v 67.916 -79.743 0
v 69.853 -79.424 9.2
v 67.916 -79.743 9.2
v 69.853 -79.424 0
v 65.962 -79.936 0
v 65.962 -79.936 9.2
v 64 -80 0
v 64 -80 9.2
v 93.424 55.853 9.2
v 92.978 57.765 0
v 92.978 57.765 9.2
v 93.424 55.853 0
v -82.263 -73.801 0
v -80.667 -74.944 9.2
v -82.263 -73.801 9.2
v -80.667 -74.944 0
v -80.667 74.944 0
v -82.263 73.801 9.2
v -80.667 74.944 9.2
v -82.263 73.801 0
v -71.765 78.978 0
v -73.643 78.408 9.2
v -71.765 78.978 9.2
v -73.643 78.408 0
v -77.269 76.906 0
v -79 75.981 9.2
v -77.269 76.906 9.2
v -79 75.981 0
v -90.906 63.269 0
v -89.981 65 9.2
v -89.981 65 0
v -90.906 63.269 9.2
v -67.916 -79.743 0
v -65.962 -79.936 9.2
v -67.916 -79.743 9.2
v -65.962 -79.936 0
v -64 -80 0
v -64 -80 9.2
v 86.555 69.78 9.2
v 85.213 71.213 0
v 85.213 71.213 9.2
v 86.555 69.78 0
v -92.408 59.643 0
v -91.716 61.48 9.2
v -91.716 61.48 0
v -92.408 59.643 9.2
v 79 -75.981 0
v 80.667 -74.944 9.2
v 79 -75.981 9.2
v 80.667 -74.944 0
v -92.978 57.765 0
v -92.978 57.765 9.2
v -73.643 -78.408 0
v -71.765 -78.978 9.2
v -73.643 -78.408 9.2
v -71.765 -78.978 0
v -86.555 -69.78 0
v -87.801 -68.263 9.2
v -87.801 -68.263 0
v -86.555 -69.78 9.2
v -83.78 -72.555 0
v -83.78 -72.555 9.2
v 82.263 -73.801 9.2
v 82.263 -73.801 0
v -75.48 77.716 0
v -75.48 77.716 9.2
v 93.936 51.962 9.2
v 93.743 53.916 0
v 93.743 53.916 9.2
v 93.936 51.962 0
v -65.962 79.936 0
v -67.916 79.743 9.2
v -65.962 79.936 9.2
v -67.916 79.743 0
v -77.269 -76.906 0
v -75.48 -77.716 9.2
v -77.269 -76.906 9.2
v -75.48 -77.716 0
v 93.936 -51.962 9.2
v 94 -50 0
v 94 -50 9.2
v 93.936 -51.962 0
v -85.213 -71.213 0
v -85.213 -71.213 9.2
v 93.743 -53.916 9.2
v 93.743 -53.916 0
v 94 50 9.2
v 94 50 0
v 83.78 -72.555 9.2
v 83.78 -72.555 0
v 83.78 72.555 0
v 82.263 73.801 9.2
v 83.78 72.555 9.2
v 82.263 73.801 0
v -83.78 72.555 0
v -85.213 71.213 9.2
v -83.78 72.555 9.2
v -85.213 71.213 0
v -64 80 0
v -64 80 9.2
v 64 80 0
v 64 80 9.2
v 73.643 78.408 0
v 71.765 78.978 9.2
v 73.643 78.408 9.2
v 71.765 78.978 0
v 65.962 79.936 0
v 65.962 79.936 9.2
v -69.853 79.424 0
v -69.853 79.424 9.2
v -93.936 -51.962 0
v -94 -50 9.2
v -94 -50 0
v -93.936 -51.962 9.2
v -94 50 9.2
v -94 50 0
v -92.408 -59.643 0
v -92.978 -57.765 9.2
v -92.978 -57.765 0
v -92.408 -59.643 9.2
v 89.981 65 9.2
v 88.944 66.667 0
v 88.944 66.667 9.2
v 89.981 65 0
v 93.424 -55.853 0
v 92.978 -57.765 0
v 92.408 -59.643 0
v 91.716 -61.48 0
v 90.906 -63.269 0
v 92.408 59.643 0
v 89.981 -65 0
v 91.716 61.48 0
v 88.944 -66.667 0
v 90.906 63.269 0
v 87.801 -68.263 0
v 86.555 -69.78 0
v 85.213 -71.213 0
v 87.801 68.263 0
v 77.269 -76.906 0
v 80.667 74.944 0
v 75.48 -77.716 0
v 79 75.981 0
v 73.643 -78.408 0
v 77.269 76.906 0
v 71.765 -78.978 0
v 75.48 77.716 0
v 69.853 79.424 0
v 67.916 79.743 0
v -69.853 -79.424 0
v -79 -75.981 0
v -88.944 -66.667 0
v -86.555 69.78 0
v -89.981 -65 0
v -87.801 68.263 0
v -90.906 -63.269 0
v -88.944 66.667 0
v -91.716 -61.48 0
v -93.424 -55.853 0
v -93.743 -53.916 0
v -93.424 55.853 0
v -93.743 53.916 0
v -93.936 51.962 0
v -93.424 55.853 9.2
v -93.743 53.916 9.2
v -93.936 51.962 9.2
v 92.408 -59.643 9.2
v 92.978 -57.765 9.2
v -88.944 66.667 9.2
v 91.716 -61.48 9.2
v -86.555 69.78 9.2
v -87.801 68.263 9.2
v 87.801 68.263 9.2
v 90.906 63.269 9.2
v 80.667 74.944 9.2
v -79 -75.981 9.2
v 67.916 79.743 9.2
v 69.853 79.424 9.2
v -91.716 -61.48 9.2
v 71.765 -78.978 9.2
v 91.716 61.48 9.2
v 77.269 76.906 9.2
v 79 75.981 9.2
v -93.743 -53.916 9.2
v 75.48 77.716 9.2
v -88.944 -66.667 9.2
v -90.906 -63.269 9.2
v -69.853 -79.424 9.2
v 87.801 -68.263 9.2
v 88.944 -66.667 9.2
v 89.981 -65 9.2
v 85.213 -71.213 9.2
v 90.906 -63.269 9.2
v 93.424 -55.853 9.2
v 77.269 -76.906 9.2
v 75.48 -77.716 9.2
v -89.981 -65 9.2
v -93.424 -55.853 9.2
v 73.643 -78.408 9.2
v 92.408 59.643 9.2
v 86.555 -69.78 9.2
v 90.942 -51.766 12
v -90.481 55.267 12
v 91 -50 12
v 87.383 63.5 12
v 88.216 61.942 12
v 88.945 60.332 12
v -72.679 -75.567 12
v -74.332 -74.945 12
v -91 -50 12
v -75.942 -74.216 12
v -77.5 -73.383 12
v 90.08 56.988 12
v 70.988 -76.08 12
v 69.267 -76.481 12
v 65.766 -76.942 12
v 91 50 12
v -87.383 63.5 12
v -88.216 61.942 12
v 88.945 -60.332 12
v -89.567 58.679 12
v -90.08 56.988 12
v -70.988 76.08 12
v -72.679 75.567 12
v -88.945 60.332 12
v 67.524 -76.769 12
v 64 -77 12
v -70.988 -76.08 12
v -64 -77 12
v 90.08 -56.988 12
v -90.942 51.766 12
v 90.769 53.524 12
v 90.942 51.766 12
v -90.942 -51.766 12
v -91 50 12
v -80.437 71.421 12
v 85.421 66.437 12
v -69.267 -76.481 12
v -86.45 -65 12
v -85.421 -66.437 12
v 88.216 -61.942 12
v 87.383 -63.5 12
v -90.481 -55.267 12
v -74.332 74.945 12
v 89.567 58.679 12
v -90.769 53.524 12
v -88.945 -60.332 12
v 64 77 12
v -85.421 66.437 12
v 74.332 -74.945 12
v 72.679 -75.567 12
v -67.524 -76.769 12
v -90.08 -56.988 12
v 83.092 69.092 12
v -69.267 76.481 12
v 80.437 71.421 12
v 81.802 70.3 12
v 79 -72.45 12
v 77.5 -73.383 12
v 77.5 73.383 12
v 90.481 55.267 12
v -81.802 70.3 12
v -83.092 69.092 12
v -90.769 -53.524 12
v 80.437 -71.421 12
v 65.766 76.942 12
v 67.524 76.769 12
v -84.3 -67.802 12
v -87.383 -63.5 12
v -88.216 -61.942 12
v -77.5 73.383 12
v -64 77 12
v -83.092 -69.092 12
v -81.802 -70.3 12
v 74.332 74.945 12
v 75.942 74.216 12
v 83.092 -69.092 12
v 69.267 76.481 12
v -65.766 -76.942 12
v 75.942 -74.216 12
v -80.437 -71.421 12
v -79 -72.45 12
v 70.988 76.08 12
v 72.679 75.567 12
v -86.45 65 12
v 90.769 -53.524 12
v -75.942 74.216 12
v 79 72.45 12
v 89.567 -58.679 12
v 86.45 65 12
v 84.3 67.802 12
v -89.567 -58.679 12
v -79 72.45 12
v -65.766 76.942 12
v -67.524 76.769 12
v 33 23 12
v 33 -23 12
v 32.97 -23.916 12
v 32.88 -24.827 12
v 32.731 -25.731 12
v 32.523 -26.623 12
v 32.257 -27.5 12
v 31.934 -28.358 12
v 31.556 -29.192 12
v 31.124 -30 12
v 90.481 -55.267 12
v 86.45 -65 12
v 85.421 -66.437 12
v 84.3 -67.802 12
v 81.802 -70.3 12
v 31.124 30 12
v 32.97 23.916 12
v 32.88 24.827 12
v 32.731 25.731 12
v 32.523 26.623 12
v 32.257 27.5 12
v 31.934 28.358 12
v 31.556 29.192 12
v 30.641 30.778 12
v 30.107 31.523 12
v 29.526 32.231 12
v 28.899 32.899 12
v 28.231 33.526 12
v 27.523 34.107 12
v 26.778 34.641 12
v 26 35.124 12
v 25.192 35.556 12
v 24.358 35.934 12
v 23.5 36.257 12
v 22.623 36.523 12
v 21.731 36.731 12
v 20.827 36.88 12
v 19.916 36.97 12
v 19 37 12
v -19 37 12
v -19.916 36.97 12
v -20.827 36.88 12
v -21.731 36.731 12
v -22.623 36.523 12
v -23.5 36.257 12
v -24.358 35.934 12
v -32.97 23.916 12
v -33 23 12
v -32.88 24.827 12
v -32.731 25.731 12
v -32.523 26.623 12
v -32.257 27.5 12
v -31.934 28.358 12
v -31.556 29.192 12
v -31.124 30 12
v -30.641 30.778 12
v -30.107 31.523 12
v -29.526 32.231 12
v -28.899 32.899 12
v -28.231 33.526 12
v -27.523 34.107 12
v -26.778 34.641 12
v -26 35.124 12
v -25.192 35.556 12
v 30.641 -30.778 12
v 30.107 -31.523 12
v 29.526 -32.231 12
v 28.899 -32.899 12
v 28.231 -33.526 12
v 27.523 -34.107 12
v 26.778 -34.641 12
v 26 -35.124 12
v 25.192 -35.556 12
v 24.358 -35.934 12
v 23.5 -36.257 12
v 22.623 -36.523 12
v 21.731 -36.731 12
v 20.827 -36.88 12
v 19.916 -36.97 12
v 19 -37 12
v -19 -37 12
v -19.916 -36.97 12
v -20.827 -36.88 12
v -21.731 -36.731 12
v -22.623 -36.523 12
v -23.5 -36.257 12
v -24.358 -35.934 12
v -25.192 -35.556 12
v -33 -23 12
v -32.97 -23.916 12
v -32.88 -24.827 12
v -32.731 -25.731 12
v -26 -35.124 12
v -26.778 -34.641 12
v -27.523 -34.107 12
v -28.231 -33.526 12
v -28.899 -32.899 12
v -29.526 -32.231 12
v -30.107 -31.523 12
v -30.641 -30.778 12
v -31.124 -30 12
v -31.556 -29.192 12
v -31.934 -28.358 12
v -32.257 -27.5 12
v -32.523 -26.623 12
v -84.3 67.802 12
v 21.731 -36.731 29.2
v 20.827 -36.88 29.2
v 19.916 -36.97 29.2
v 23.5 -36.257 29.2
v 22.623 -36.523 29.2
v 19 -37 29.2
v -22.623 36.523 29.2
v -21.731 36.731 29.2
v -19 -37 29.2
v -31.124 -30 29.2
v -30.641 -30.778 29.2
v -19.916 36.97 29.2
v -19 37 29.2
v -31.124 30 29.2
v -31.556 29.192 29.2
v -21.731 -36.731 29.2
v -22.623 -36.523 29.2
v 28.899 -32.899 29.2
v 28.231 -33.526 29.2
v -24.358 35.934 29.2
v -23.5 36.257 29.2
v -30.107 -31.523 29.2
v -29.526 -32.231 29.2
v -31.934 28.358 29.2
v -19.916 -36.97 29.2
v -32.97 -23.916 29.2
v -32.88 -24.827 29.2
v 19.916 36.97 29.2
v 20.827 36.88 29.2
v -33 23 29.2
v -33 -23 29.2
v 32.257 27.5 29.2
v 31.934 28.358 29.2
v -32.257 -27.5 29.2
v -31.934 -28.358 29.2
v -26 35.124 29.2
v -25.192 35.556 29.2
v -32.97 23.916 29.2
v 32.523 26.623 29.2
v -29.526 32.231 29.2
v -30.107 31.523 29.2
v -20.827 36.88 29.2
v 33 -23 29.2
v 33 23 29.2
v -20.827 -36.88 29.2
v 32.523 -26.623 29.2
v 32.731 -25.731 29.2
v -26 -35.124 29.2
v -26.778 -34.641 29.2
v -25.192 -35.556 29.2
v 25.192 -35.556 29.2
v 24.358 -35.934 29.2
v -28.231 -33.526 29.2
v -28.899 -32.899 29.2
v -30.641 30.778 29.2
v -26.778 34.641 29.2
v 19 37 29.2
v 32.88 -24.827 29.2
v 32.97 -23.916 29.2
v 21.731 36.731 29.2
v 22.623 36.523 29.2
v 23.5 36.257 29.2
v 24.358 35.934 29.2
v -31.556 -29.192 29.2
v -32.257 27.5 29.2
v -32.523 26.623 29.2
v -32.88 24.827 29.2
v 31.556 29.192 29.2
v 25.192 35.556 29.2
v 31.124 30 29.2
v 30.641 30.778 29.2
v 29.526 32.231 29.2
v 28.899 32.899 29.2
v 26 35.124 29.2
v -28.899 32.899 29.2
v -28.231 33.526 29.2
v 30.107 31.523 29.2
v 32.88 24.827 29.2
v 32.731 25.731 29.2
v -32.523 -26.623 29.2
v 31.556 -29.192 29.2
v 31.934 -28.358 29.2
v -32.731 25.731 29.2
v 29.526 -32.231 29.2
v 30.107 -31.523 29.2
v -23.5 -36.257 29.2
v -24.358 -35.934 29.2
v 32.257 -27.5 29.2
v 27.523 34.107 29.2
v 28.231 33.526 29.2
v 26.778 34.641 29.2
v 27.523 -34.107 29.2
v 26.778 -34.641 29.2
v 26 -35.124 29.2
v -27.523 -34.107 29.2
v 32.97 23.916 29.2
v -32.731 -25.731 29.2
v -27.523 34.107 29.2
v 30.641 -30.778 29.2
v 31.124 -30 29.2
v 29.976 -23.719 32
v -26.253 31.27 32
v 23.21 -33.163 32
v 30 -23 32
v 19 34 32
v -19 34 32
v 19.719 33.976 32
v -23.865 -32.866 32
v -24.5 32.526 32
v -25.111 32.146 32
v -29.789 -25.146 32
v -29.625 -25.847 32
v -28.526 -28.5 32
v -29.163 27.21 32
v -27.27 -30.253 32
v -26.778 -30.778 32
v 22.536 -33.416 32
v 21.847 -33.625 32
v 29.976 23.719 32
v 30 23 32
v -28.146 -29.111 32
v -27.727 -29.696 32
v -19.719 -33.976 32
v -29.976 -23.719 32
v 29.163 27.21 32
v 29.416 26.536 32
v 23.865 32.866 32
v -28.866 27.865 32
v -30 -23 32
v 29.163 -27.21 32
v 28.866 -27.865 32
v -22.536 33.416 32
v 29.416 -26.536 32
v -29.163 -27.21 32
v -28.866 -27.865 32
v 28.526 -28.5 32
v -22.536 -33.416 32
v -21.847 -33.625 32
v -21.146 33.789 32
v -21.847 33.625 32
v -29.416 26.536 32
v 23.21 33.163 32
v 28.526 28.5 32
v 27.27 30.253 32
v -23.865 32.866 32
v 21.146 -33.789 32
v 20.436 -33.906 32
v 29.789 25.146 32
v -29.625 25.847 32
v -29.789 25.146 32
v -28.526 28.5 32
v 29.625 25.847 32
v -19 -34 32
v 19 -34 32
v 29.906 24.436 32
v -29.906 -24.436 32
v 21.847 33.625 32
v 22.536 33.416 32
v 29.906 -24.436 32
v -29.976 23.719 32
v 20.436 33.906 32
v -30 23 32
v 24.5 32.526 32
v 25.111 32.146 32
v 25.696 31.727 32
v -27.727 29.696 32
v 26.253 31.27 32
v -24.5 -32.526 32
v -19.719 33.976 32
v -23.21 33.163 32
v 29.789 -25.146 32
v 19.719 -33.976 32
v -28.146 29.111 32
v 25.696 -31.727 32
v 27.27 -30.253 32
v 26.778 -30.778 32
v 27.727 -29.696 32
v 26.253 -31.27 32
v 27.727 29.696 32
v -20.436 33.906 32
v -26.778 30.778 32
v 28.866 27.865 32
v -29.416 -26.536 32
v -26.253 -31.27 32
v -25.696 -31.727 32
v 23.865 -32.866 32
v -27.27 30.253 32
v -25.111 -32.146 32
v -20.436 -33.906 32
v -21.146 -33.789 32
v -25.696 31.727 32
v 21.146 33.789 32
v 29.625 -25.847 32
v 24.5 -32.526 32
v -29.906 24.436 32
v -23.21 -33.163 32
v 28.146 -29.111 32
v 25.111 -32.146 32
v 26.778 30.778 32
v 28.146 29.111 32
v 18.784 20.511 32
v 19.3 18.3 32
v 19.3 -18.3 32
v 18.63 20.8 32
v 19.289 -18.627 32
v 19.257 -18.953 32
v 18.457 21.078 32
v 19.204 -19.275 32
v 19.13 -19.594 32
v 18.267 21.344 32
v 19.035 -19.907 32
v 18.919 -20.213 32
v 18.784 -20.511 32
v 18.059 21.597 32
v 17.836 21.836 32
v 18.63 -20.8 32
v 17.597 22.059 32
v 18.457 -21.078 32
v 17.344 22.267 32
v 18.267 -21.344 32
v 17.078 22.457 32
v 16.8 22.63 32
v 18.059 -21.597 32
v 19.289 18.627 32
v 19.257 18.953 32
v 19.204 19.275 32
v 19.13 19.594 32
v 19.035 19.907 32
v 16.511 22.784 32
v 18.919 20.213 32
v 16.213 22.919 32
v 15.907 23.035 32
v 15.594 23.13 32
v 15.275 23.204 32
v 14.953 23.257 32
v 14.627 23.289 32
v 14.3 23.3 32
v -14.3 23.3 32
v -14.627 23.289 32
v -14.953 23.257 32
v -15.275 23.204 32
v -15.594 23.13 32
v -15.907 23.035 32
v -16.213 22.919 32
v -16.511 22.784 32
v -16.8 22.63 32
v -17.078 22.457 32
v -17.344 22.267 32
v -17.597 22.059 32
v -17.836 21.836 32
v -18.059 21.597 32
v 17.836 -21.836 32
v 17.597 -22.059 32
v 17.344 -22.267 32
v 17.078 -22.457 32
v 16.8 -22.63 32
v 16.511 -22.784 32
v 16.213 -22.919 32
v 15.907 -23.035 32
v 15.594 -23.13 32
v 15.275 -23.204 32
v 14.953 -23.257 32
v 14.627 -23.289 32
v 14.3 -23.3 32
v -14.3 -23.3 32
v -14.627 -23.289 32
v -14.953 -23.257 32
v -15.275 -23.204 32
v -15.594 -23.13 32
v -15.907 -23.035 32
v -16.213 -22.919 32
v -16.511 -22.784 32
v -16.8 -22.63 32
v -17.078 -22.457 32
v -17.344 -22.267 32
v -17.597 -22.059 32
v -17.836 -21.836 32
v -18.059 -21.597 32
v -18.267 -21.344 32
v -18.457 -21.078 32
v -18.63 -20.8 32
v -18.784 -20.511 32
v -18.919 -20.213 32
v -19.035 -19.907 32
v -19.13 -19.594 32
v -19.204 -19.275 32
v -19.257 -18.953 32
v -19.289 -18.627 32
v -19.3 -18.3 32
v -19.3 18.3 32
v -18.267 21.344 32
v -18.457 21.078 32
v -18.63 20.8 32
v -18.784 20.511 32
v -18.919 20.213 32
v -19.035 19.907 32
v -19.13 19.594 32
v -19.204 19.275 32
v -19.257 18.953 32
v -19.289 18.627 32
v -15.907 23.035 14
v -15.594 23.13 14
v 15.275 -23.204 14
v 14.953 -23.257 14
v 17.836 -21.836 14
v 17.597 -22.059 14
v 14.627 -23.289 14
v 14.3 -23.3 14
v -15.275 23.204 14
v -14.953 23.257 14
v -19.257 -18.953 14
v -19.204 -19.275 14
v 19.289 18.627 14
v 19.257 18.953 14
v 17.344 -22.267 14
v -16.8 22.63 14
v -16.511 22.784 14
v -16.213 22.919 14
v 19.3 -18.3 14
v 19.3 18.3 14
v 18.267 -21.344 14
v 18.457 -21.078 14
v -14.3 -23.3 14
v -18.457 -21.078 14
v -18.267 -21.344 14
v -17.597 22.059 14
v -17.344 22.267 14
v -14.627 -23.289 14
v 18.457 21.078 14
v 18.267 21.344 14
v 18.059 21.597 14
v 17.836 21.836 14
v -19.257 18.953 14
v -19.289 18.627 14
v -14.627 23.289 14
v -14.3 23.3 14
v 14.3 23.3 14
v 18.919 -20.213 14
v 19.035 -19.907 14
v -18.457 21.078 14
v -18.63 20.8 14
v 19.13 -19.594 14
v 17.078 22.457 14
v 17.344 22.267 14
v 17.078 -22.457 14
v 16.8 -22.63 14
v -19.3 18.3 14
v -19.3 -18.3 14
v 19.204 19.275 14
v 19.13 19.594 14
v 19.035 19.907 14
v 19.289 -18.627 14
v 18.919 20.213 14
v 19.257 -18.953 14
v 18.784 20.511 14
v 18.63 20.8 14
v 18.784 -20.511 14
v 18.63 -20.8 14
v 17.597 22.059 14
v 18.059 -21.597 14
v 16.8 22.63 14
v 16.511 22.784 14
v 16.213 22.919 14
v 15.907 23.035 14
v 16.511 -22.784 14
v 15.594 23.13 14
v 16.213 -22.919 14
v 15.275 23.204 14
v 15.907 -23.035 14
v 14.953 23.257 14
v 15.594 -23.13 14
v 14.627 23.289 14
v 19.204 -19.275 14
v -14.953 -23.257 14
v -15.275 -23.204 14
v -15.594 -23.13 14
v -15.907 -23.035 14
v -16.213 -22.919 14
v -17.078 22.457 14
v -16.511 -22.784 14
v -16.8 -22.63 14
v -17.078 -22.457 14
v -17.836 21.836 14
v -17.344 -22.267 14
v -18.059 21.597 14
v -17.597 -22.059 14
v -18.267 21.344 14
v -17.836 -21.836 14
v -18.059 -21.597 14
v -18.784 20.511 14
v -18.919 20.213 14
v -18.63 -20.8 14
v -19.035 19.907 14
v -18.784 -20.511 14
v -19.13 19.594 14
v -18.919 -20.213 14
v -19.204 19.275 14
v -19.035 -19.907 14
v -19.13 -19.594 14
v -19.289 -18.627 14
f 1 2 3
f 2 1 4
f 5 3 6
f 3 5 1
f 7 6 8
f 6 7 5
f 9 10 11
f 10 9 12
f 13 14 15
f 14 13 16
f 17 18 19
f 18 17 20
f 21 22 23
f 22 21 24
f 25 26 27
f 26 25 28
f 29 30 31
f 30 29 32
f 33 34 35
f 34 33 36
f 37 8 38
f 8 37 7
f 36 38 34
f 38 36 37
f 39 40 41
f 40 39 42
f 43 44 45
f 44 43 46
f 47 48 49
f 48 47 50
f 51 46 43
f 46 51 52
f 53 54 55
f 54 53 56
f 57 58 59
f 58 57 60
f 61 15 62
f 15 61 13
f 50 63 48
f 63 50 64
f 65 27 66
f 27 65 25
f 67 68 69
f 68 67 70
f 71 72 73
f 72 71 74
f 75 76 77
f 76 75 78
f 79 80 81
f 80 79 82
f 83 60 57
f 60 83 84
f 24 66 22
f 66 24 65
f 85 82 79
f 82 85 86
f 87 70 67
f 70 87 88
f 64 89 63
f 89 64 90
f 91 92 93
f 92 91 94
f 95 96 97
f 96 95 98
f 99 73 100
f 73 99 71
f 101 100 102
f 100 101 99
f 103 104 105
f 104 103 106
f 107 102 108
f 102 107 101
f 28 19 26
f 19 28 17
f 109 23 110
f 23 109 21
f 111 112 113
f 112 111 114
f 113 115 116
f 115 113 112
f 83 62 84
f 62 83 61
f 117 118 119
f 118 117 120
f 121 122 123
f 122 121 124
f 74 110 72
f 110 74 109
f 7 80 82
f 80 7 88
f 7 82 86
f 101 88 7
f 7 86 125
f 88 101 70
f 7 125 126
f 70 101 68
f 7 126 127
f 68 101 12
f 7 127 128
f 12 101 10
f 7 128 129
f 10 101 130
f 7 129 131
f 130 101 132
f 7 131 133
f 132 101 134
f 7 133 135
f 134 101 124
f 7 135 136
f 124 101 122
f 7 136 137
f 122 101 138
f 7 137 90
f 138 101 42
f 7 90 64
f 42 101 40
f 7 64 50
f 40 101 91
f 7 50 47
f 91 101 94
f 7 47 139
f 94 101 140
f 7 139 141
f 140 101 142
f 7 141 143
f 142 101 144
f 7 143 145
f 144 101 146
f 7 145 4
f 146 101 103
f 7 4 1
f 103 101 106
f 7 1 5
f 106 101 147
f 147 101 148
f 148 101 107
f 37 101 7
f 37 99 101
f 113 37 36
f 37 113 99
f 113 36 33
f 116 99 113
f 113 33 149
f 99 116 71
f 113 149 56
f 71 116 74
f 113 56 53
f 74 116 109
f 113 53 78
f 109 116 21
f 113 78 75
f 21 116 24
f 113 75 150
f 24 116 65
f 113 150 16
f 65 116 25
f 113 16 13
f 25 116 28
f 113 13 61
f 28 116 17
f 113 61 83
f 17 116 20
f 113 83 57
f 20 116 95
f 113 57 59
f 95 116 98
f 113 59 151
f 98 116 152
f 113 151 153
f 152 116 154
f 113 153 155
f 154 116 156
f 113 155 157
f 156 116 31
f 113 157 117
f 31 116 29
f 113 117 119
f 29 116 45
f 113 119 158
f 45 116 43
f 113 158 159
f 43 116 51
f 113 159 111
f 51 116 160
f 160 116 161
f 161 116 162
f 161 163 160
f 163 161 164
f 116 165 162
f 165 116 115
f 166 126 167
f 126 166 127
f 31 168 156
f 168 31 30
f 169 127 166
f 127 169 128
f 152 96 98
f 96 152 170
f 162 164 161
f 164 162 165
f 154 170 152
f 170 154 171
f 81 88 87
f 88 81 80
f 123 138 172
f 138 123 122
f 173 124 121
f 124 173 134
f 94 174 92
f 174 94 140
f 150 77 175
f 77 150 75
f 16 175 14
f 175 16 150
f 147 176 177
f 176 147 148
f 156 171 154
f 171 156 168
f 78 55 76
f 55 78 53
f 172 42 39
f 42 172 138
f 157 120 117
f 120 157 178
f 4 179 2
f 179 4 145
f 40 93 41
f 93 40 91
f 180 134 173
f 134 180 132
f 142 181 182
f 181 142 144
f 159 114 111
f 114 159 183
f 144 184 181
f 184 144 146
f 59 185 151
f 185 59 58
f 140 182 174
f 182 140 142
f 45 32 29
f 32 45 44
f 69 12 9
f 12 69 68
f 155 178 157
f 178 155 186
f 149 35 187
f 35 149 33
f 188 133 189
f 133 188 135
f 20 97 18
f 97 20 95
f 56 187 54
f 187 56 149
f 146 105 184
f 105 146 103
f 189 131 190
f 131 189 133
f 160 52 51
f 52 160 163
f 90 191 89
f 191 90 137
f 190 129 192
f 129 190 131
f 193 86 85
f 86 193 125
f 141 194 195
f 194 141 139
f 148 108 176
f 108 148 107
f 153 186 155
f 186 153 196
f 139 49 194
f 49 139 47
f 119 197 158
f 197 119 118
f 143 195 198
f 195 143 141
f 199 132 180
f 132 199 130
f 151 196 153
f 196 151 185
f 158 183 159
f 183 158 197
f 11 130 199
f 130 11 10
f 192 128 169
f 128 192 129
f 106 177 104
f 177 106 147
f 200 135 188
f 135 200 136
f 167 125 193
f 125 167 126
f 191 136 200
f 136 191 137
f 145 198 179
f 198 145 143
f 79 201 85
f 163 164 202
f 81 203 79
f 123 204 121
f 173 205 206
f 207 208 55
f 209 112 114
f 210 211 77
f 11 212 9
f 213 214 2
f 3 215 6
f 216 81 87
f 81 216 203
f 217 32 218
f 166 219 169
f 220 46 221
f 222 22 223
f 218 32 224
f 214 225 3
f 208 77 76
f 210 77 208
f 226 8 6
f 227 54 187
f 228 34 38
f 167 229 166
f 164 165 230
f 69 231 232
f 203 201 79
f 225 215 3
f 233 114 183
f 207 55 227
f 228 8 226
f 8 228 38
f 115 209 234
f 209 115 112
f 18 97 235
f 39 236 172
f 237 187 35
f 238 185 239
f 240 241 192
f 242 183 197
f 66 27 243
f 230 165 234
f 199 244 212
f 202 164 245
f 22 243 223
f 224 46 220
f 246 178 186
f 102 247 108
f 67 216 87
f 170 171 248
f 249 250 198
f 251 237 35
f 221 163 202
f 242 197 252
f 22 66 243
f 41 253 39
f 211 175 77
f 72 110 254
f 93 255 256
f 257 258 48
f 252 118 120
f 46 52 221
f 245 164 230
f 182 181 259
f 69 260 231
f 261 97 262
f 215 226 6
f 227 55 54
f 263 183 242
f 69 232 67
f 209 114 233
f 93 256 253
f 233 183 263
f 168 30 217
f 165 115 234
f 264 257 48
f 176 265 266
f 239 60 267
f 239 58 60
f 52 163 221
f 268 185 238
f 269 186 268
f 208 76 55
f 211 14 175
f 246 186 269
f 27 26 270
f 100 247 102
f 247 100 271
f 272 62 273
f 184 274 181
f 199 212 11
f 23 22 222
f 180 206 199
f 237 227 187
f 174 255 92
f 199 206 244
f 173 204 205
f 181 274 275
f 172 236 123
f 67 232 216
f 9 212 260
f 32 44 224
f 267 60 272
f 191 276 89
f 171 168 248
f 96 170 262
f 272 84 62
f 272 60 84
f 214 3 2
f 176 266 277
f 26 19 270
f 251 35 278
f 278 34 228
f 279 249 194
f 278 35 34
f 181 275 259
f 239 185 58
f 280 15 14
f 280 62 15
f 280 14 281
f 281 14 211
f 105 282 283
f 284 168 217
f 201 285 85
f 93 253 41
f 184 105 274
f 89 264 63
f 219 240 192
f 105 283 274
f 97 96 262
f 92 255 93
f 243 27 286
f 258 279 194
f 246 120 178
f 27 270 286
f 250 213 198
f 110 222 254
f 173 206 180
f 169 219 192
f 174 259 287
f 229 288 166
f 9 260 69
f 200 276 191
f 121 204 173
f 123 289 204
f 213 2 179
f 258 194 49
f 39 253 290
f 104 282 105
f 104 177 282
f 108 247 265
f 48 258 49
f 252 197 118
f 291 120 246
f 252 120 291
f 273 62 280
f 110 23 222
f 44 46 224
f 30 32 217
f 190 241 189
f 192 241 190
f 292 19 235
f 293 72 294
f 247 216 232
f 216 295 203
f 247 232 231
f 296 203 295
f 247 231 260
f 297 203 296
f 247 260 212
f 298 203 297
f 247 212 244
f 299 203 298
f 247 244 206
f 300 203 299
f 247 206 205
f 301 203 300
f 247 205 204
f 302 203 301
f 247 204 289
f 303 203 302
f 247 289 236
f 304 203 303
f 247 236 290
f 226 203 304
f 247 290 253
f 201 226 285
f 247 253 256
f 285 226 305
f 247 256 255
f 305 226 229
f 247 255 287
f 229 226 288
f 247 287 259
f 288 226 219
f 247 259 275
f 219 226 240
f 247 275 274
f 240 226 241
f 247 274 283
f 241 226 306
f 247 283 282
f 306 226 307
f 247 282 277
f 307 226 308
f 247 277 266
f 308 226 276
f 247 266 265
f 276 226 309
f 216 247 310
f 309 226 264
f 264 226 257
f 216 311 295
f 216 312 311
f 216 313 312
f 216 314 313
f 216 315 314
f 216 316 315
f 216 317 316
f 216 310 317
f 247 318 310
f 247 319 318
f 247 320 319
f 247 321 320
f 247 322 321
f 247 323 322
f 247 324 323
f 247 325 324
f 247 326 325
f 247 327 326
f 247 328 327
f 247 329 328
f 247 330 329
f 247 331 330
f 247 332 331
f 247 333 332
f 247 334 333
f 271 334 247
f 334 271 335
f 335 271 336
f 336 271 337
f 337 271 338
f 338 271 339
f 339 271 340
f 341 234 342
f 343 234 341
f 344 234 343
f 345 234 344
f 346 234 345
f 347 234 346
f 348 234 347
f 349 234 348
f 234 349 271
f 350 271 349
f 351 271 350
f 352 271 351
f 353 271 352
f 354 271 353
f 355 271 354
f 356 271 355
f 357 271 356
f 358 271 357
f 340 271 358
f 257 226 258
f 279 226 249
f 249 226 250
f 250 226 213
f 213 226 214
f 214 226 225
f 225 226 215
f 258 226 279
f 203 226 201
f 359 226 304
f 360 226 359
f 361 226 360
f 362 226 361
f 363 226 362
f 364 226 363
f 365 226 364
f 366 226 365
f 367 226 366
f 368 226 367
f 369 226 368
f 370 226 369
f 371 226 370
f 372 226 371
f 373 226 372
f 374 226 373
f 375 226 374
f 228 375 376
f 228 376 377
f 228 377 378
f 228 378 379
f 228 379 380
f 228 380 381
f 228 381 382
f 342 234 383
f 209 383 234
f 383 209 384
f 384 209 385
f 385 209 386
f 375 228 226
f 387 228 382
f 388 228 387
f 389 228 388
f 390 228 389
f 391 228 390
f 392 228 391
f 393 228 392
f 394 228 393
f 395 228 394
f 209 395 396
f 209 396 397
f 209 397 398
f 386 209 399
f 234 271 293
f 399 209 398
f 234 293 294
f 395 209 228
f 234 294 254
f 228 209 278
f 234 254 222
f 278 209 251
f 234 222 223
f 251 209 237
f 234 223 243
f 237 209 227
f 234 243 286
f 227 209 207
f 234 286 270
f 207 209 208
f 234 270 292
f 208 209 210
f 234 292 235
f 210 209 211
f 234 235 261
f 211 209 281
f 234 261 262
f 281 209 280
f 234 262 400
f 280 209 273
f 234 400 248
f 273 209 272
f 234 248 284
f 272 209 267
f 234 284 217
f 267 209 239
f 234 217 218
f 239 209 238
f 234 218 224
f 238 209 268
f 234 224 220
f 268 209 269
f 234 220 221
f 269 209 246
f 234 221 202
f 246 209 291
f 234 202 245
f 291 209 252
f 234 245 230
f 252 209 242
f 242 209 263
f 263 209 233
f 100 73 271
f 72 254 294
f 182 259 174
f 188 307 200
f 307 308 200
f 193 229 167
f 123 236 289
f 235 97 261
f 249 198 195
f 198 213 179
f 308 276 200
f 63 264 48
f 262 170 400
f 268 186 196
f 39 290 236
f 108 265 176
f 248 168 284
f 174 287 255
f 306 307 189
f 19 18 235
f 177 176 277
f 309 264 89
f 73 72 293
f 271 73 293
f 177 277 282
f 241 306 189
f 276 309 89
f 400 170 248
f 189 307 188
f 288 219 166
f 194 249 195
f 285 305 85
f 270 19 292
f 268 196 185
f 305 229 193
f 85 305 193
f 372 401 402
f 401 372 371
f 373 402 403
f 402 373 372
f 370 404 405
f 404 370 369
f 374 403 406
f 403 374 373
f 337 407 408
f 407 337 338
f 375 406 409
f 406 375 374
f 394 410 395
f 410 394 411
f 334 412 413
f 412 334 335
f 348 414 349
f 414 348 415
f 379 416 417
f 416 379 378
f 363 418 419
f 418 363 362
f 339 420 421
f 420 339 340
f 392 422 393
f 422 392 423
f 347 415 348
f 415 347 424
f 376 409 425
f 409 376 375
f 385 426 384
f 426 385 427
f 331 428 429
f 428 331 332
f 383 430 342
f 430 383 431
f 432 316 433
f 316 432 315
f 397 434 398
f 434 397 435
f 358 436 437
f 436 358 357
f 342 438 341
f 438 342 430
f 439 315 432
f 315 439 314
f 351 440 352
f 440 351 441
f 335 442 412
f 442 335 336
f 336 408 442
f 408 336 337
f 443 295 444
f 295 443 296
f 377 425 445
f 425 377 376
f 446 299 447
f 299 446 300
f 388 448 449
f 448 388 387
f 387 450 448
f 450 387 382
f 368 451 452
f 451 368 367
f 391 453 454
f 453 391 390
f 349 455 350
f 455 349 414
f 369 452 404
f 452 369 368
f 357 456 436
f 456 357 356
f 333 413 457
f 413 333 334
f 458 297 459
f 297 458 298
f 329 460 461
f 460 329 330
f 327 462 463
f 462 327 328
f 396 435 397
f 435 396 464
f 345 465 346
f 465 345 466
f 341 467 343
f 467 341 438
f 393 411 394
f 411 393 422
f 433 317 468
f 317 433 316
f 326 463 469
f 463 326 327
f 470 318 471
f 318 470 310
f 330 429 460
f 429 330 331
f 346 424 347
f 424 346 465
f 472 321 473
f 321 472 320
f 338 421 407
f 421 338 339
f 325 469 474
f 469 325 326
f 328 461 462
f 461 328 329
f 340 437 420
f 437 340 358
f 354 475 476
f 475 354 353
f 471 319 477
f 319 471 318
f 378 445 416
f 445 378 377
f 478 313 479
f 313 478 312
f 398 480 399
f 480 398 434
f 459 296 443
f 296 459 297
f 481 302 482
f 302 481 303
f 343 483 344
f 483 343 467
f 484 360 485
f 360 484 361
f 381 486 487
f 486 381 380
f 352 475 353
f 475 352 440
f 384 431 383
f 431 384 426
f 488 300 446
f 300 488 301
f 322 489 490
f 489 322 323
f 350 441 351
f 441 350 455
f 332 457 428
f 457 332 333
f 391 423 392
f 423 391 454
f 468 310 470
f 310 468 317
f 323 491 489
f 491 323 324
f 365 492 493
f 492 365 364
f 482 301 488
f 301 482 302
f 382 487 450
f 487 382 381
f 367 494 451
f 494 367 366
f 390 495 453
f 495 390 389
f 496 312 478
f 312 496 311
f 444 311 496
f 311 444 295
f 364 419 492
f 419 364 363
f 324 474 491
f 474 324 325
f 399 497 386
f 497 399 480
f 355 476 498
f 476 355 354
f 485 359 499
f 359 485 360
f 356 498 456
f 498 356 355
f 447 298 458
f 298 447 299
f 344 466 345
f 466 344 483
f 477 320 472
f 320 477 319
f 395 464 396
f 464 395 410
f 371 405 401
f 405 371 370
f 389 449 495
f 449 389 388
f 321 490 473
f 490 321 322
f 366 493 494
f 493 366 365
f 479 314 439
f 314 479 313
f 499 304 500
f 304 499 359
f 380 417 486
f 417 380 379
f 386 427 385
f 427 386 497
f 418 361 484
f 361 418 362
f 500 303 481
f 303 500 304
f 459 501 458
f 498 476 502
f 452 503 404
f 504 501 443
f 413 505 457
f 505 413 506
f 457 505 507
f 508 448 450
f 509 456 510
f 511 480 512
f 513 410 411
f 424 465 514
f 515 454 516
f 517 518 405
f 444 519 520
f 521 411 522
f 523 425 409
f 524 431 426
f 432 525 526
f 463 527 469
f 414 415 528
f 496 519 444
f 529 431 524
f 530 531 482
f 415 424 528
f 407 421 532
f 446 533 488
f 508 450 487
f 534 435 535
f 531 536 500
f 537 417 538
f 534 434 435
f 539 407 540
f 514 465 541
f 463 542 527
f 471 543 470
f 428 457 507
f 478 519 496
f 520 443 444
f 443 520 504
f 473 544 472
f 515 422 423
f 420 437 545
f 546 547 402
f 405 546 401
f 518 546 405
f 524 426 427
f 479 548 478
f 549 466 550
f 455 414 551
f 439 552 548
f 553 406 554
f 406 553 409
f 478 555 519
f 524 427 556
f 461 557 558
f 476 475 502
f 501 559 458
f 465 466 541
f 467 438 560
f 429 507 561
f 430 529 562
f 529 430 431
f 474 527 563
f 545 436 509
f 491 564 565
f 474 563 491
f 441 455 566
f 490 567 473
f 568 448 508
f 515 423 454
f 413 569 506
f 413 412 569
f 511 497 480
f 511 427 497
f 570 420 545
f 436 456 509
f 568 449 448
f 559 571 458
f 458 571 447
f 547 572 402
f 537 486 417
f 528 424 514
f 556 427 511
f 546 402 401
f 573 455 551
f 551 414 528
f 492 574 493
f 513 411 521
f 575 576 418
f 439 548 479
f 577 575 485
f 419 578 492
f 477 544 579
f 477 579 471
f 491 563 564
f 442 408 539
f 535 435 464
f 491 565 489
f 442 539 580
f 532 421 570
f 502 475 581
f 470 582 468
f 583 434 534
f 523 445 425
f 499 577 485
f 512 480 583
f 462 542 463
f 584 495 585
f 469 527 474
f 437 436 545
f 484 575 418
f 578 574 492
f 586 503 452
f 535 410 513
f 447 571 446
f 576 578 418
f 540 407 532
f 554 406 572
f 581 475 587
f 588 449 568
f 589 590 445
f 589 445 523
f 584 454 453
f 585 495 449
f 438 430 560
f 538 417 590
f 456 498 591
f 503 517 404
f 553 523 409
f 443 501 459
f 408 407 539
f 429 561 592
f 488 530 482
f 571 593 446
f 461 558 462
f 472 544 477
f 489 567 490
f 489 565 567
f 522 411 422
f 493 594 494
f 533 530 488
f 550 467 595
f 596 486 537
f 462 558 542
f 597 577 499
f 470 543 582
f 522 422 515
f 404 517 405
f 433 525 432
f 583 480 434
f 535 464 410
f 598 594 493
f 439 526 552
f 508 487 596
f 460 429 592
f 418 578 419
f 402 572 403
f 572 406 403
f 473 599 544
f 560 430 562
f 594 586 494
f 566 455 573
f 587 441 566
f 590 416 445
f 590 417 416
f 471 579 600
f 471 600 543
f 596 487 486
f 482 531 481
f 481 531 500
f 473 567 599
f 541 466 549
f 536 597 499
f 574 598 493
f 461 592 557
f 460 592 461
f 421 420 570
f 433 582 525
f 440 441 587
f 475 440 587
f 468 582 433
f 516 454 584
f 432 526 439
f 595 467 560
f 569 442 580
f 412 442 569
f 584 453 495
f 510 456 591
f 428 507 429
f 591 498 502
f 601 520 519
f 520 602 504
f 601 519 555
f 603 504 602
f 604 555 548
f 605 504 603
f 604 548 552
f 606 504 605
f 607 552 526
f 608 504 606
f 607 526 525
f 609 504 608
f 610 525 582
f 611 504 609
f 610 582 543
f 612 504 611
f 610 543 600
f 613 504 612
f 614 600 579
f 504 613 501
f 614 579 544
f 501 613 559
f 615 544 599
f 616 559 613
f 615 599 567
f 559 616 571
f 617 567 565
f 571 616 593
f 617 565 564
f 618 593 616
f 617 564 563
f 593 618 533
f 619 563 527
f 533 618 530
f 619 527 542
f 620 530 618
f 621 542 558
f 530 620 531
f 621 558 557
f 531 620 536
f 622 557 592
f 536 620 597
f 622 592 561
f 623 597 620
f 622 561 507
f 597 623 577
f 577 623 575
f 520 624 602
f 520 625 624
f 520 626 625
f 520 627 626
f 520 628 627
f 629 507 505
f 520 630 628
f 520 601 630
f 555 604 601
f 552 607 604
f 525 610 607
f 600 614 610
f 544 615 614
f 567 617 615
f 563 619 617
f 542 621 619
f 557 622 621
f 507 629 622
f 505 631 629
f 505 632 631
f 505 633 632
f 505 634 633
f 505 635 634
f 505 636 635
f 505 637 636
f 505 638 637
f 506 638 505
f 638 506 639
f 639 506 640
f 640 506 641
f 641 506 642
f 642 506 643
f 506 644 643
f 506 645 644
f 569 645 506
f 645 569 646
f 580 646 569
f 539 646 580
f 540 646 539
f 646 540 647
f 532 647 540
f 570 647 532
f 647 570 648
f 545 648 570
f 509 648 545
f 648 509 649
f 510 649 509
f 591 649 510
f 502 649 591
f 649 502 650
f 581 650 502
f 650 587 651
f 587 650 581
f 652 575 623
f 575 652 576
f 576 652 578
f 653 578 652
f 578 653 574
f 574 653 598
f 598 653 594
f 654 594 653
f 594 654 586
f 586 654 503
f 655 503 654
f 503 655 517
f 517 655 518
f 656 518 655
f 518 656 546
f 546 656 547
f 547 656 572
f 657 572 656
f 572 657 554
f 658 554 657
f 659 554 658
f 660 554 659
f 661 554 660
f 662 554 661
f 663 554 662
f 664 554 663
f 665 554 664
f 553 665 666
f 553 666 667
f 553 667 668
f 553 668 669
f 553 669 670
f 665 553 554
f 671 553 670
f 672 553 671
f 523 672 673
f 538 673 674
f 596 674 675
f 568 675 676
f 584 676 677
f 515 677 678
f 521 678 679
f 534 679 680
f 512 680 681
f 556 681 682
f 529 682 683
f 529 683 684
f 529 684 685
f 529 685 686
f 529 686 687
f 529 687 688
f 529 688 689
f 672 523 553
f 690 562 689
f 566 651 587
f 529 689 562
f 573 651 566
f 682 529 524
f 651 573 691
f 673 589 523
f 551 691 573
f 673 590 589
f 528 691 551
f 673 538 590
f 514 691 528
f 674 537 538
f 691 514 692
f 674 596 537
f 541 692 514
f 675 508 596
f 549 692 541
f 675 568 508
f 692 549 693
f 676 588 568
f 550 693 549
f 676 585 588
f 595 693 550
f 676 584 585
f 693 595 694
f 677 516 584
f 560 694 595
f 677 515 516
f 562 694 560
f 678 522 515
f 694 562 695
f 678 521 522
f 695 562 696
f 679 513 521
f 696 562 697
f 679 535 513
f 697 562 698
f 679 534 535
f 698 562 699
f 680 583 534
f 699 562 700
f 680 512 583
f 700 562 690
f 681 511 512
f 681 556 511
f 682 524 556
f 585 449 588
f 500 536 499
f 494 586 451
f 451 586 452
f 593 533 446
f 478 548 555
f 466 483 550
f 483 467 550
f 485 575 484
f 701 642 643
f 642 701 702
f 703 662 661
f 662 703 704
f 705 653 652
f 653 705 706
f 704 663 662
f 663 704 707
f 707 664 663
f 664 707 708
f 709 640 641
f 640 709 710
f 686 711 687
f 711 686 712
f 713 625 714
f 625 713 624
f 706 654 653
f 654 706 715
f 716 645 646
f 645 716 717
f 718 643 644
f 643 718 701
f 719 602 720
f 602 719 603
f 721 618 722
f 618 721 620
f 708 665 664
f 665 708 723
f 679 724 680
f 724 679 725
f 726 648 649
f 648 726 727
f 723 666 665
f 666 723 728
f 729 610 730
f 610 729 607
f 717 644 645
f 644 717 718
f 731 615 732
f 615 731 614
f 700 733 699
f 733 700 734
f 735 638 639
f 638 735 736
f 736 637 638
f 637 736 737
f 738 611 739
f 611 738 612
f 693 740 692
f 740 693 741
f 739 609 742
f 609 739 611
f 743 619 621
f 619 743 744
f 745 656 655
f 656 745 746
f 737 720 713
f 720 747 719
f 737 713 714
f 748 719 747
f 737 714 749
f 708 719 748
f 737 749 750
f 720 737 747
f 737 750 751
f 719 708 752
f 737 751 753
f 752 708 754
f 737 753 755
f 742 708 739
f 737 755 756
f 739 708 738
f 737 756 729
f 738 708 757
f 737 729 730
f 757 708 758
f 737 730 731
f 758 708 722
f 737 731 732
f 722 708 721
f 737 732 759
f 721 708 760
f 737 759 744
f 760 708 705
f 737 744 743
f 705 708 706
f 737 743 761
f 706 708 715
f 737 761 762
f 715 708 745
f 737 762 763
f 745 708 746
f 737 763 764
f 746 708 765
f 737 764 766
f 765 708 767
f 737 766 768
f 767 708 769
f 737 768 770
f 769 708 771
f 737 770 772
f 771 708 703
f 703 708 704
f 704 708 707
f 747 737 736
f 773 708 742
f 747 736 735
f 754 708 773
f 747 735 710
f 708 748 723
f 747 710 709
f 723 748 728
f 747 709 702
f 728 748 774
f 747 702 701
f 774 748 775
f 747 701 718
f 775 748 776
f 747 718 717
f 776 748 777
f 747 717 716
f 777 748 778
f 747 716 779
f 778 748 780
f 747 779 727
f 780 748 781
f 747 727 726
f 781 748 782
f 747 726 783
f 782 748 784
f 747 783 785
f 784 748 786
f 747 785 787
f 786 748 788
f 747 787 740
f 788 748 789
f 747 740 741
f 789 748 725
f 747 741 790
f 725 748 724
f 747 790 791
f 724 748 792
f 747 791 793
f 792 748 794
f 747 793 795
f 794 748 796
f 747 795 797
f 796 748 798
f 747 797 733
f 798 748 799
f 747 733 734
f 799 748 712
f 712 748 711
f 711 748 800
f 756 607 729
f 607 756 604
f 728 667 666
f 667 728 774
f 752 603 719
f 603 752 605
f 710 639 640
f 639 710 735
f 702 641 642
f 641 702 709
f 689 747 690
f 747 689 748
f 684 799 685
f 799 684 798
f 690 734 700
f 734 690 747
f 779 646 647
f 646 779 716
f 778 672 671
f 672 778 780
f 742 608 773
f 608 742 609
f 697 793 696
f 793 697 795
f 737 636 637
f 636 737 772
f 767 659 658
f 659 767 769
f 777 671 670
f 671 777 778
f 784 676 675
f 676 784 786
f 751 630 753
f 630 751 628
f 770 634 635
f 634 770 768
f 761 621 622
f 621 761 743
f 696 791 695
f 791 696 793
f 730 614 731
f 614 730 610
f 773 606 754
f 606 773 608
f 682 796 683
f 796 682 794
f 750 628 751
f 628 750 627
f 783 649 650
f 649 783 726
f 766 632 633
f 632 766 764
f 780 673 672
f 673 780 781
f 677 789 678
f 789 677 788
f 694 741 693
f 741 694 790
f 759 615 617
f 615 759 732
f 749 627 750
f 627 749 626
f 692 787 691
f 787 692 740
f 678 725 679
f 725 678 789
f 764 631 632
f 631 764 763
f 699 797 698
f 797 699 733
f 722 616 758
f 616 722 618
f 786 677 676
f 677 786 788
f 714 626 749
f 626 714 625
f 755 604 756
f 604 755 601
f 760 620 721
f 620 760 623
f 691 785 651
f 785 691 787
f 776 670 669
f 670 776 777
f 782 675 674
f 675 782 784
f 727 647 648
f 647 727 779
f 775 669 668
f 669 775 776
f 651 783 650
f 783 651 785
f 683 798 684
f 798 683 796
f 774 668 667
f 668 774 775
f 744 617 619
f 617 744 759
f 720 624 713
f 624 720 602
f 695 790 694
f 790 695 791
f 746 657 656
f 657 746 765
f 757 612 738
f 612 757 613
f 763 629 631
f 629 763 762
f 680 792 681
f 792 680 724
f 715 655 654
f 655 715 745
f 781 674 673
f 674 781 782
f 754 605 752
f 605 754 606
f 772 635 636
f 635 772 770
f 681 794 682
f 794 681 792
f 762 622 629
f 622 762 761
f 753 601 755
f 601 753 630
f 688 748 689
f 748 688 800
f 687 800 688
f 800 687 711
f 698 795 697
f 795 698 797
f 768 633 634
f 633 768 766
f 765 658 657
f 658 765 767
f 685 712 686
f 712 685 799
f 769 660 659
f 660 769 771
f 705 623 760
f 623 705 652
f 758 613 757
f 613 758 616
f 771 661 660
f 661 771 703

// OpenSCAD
// Headphone stand in three printable parts: base, post, hanger.
// No glue, no screws. Rectangular (non-round) blade tenons prevent spinning.
// All dimensions in mm. Print orientation is the exported orientation (+Z up).
//
// Assembly heights (assembly coordinates, desk at z=0):
//   base plate/boss top        0 .. 32
//   post                       14.5 .. 250  (17.5 mm of it inside the base socket)
//   hanger tenon               228.5 .. 250 (21.5 mm inside the post socket)
//   hanger saddle top centre   270
// Socket clearances: 0.3 mm per side (socket is tenon + 0.6 in each dimension),
// tenon tips stop 0.5 mm above socket floors; shoulders/faces give the depth stop
// for the hanger, and the post bottoms in its socket.

part = "base"; // [base, post, hanger, assembly]
cadverify_only = "";

$fn = 96;

/* [Base] */
base_w = 188;          // desk footprint, X
base_d = 160;          // desk footprint, Y
base_plate_top = 9;    // straight plate wall up to here, then 45 deg chamfer to 12
base_top_plate = 12;
boss_w = 66;
boss_d = 74;
boss_straight_top = 29; // then 45 deg chamfer to boss_top
boss_top = 32;
base_socket_w = 38.6;  // post 38 + 0.6
base_socket_d = 46.6;  // post 46 + 0.6
base_socket_floor = 14;

/* [Post] */
post_w = 38;
post_d = 46;
post_len = 235.5;      // tip (local z=0) to top (assembly 250)
post_top_socket_w = 24.6; // hanger tenon 24 + 0.6
post_top_socket_d = 34.6; // hanger tenon 34 + 0.6
post_top_socket_floor_local = 213.5; // assembly 228

/* [Hanger, modelled in print coordinates] */
// Print coordinates: X = saddle length, Y = height above tenon tip,
// Z = saddle width direction (part lies on its Z=0 side face on the bed).
hang_len_half = 69;    // overall saddle half length incl. rounded end point
hang_width = 34;       // >= 30 mm headband support width
hang_top_rel = 41.5;   // tenon tip to saddle crown; assembly 228.5 + 41.5 = 270
hang_arc_r = 170;      // crown radius of the headband contact surface
hang_plate_t = 10;     // saddle plate thickness (vertical, in profile)
hang_tenon_half_w = 12;  // tenon is 24 (X) x 34 (width)
hang_shoulder_rel = 21.5; // assembly 250, post top
hang_neck_half_w = 17;

function hang_top_z(x) = hang_top_rel - (hang_arc_r - sqrt(hang_arc_r*hang_arc_r - x*x));
function hang_bot_z(x) = hang_top_z(x) - hang_plate_t;

module rounded_rect(w, d, r) {
    offset(r = r) square([w - 2*r, d - 2*r], center = true);
}

module instance(name, part_name, unit = 1) {
    echo(cadverify_instance = [name, part_name, unit]);
    if (cadverify_only == "" || cadverify_only == name) children();
}

/* ---------- BASE (print = assembly orientation) ---------- */
module base_part() {
    difference() {
        union() {
            // desk plate with 45 deg top edge chamfer
            linear_extrude(base_plate_top) rounded_rect(base_w, base_d, 30);
            hull() {
                translate([0, 0, base_plate_top]) linear_extrude(0.2)
                    rounded_rect(base_w, base_d, 30);
                translate([0, 0, base_top_plate - 0.2]) linear_extrude(0.2)
                    rounded_rect(base_w - 6, base_d - 6, 27);
            }
            // raised boss / collar around the post socket, 45 deg top chamfer
            translate([0, 0, base_top_plate])
                linear_extrude(boss_straight_top - base_top_plate)
                    rounded_rect(boss_w, boss_d, 14);
            hull() {
                translate([0, 0, boss_straight_top]) linear_extrude(0.2)
                    rounded_rect(boss_w, boss_d, 14);
                translate([0, 0, boss_top - 0.2]) linear_extrude(0.2)
                    rounded_rect(boss_w - 6, boss_d - 6, 11);
            }
        }
        // blind rectangular socket for the post (stops post spinning)
        translate([0, 0, base_socket_floor])
            linear_extrude(boss_top - base_socket_floor + 2)
                rounded_rect(base_socket_w, base_socket_d, 5);
    }
}

/* ---------- POST (printed upright, local z=0 is tenon tip) ---------- */
module post_part() {
    difference() {
        linear_extrude(post_len) rounded_rect(post_w, post_d, 8);
        // blind rectangular socket in the top for the hanger blade tenon
        translate([0, 0, post_top_socket_floor_local])
            linear_extrude(post_len - post_top_socket_floor_local + 2)
                rounded_rect(post_top_socket_w, post_top_socket_d, 5);
    }
}

/* ---------- HANGER (printed on its side) ---------- */
module hanger_part() {
    top_pts    = [for (x = [56 : -8 : -56]) [x, hang_top_z(x)]];
    bot_r_pts  = [for (x = [40 : 8 : 64]) [x, hang_bot_z(x)]];
    bot_l_pts  = [for (x = [-64 : 8 : -40]) [x, hang_bot_z(x)]];
    mid64 = (hang_top_z(64) + hang_bot_z(64)) / 2;
    // Saddle/neck profile above the shoulder plane (print y = hang_shoulder_rel).
    profile = concat(
        [[-hang_neck_half_w, hang_shoulder_rel], [hang_neck_half_w, hang_shoulder_rel],
         [30, hang_bot_z(30)]],
        bot_r_pts,
        [[hang_len_half - 0.5, mid64], [64, hang_top_z(64)]],
        top_pts,
        [[-64, hang_top_z(64)], [-(hang_len_half - 0.5), mid64], [-64, hang_bot_z(64)]],
        bot_l_pts,
        [[-30, hang_bot_z(30)]]
    );
    difference() {
        union() {
            linear_extrude(hang_width) polygon(profile);
            // Blade tenon below the shoulder: 24 x 34 with 4 mm corner radii,
            // so it clears the post socket's 5 mm rounded corners. It reaches
            // 2 mm up into the neck so the union is volumetric, not face-only.
            translate([0, 0, hang_width/2]) rotate([-90, 0, 0])
                linear_extrude(hang_shoulder_rel + 2)
                    rounded_rect(2*hang_tenon_half_w, hang_width, 4);
        }
        // 45 deg chamfers on the two crown side edges, limited to the central
        // contact zone |x| <= 36: the box spans start at x = +-36, meet at the
        // edge point (|x|, crown) = (36, hang_top_z(36)) and stop 3 mm inside
        // the crown (tangency point), so the chamfer widens the crown flat to
        // 3 mm at |x| = 36+ and the plate keeps full width beyond it.
        // far side: keeps Z + Y <= hang_top_z(36) + hang_width
        translate([0, hang_top_z(36) + hang_width, hang_width]) rotate([135, 0, 0])
            translate([-36, 0, 0]) cube([72, 40, 40]);
        // bed side: keeps Z - Y >= -hang_top_z(36)
        translate([0, hang_top_z(36), 0]) rotate([-135, 0, 0])
            translate([-36, 0, 0]) cube([72, 40, 40]);
    }
}

/* ---------- Spec echoes ---------- */
if (part == "base") {
    echo(cadverify_spec = [
        ["bounds", [[-base_w/2, -base_d/2, 0], [base_w/2, base_d/2, boss_top]]],
        ["bodies", 1],
        ["through_holes", 0],
        ["support_faces", [["desk", "-z", 25000]]],
        ["overhangs_allowed", []],
        ["copies", 1],
        ["details", [
            ["plate", "material", [[-80, -60, 2], [80, 60, 10]], 0.99],
            ["boss_wall", "material", [[22, -30, 16], [31, 30, 28]], 0.99],
            ["post_socket", "void", [[-17, -21, 16], [17, 21, 30]], 0.99],
            ["socket_floor", "thickness", [0, 0, 42], [0, 0, -1], base_socket_floor],
            ["boss_socket_top", "view", [[-34, -38, 27], [34, 38, boss_top]]]
        ]]
    ]);
} else if (part == "post") {
    echo(cadverify_spec = [
        ["bounds", [[-post_w/2, -post_d/2, 0], [post_w/2, post_d/2, post_len]]],
        ["bodies", 1],
        ["through_holes", 0],
        ["support_faces", [["bed", "-z", 1500]]],
        ["overhangs_allowed", []],
        ["copies", 1],
        ["details", [
            ["column", "material", [[-16, -20, 30], [16, 20, 200]], 0.99],
            ["hanger_socket", "void", [[-10, -15, 216], [10, 15, 234]], 0.99],
            ["column_width", "thickness", [32, 0, 100], [-1, 0, 0], post_w],
            ["top_socket", "view", [[-19, -23, 210], [19, 23, post_len]]]
        ]]
    ]);
} else if (part == "hanger") {
    // actual extreme points are the saddle end tips at +-(hang_len_half - 0.5)
    echo(cadverify_spec = [
        ["bounds", [[-(hang_len_half - 0.5), 0, 0], [hang_len_half - 0.5, hang_top_rel, hang_width]]],
        ["bodies", 1],
        ["through_holes", 0],
        ["support_faces", [["bed", "-z", 1200]]],
        ["overhangs_allowed", [
            ["45deg crown chamfer on bed side", [[-36, 37, 0], [36, hang_top_rel, 5]]]
        ]],
        ["copies", 1],
        ["details", [
            ["saddle_plate", "material", [[-25, 32, 5], [25, 38, 29]], 0.99],
            ["tenon", "material", [[-10, 2, 5], [10, 20, 29]], 0.99],
            ["saddle_thickness", "thickness", [50, 52, 17], [0, -1, 0], hang_plate_t],
            ["rounded_crown", "view", [[-40, 27, 0], [40, hang_top_rel, hang_width]]]
        ]]
    ]);
} else if (part == "assembly") {
    echo(cadverify_spec = [
        ["bounds", [[-base_w/2, -base_d/2, 0], [base_w/2, base_d/2, 270]]],
        ["support_faces", [["desk", "-z", 25000]]],
        ["allowed_interferences", []],
        ["assembly_order", [
            [["base"], [0, 0, 0]],
            [["post"], [0, 0, -1]],
            [["hanger"], [0, 0, -1]]
        ]]
    ]);
}

/* ---------- Output ---------- */
if (part == "base") {
    base_part();
} else if (part == "post") {
    post_part();
} else if (part == "hanger") {
    hanger_part();
} else if (part == "assembly") {
    instance("base", "base") base_part();
    instance("post", "post") translate([0, 0, 14.5]) post_part();
    // hanger print coords (x, y=height rel. tenon tip, z=width)
    //   -> assembly (x, 17-z, 228.5+y): tenon tip at 228.5, crown at 270
    instance("hanger", "hanger")
        translate([0, hang_width/2, 228.5]) rotate([90, 0, 0]) hanger_part();
} else {
    assert(false, str("unknown part: ", part));
}
